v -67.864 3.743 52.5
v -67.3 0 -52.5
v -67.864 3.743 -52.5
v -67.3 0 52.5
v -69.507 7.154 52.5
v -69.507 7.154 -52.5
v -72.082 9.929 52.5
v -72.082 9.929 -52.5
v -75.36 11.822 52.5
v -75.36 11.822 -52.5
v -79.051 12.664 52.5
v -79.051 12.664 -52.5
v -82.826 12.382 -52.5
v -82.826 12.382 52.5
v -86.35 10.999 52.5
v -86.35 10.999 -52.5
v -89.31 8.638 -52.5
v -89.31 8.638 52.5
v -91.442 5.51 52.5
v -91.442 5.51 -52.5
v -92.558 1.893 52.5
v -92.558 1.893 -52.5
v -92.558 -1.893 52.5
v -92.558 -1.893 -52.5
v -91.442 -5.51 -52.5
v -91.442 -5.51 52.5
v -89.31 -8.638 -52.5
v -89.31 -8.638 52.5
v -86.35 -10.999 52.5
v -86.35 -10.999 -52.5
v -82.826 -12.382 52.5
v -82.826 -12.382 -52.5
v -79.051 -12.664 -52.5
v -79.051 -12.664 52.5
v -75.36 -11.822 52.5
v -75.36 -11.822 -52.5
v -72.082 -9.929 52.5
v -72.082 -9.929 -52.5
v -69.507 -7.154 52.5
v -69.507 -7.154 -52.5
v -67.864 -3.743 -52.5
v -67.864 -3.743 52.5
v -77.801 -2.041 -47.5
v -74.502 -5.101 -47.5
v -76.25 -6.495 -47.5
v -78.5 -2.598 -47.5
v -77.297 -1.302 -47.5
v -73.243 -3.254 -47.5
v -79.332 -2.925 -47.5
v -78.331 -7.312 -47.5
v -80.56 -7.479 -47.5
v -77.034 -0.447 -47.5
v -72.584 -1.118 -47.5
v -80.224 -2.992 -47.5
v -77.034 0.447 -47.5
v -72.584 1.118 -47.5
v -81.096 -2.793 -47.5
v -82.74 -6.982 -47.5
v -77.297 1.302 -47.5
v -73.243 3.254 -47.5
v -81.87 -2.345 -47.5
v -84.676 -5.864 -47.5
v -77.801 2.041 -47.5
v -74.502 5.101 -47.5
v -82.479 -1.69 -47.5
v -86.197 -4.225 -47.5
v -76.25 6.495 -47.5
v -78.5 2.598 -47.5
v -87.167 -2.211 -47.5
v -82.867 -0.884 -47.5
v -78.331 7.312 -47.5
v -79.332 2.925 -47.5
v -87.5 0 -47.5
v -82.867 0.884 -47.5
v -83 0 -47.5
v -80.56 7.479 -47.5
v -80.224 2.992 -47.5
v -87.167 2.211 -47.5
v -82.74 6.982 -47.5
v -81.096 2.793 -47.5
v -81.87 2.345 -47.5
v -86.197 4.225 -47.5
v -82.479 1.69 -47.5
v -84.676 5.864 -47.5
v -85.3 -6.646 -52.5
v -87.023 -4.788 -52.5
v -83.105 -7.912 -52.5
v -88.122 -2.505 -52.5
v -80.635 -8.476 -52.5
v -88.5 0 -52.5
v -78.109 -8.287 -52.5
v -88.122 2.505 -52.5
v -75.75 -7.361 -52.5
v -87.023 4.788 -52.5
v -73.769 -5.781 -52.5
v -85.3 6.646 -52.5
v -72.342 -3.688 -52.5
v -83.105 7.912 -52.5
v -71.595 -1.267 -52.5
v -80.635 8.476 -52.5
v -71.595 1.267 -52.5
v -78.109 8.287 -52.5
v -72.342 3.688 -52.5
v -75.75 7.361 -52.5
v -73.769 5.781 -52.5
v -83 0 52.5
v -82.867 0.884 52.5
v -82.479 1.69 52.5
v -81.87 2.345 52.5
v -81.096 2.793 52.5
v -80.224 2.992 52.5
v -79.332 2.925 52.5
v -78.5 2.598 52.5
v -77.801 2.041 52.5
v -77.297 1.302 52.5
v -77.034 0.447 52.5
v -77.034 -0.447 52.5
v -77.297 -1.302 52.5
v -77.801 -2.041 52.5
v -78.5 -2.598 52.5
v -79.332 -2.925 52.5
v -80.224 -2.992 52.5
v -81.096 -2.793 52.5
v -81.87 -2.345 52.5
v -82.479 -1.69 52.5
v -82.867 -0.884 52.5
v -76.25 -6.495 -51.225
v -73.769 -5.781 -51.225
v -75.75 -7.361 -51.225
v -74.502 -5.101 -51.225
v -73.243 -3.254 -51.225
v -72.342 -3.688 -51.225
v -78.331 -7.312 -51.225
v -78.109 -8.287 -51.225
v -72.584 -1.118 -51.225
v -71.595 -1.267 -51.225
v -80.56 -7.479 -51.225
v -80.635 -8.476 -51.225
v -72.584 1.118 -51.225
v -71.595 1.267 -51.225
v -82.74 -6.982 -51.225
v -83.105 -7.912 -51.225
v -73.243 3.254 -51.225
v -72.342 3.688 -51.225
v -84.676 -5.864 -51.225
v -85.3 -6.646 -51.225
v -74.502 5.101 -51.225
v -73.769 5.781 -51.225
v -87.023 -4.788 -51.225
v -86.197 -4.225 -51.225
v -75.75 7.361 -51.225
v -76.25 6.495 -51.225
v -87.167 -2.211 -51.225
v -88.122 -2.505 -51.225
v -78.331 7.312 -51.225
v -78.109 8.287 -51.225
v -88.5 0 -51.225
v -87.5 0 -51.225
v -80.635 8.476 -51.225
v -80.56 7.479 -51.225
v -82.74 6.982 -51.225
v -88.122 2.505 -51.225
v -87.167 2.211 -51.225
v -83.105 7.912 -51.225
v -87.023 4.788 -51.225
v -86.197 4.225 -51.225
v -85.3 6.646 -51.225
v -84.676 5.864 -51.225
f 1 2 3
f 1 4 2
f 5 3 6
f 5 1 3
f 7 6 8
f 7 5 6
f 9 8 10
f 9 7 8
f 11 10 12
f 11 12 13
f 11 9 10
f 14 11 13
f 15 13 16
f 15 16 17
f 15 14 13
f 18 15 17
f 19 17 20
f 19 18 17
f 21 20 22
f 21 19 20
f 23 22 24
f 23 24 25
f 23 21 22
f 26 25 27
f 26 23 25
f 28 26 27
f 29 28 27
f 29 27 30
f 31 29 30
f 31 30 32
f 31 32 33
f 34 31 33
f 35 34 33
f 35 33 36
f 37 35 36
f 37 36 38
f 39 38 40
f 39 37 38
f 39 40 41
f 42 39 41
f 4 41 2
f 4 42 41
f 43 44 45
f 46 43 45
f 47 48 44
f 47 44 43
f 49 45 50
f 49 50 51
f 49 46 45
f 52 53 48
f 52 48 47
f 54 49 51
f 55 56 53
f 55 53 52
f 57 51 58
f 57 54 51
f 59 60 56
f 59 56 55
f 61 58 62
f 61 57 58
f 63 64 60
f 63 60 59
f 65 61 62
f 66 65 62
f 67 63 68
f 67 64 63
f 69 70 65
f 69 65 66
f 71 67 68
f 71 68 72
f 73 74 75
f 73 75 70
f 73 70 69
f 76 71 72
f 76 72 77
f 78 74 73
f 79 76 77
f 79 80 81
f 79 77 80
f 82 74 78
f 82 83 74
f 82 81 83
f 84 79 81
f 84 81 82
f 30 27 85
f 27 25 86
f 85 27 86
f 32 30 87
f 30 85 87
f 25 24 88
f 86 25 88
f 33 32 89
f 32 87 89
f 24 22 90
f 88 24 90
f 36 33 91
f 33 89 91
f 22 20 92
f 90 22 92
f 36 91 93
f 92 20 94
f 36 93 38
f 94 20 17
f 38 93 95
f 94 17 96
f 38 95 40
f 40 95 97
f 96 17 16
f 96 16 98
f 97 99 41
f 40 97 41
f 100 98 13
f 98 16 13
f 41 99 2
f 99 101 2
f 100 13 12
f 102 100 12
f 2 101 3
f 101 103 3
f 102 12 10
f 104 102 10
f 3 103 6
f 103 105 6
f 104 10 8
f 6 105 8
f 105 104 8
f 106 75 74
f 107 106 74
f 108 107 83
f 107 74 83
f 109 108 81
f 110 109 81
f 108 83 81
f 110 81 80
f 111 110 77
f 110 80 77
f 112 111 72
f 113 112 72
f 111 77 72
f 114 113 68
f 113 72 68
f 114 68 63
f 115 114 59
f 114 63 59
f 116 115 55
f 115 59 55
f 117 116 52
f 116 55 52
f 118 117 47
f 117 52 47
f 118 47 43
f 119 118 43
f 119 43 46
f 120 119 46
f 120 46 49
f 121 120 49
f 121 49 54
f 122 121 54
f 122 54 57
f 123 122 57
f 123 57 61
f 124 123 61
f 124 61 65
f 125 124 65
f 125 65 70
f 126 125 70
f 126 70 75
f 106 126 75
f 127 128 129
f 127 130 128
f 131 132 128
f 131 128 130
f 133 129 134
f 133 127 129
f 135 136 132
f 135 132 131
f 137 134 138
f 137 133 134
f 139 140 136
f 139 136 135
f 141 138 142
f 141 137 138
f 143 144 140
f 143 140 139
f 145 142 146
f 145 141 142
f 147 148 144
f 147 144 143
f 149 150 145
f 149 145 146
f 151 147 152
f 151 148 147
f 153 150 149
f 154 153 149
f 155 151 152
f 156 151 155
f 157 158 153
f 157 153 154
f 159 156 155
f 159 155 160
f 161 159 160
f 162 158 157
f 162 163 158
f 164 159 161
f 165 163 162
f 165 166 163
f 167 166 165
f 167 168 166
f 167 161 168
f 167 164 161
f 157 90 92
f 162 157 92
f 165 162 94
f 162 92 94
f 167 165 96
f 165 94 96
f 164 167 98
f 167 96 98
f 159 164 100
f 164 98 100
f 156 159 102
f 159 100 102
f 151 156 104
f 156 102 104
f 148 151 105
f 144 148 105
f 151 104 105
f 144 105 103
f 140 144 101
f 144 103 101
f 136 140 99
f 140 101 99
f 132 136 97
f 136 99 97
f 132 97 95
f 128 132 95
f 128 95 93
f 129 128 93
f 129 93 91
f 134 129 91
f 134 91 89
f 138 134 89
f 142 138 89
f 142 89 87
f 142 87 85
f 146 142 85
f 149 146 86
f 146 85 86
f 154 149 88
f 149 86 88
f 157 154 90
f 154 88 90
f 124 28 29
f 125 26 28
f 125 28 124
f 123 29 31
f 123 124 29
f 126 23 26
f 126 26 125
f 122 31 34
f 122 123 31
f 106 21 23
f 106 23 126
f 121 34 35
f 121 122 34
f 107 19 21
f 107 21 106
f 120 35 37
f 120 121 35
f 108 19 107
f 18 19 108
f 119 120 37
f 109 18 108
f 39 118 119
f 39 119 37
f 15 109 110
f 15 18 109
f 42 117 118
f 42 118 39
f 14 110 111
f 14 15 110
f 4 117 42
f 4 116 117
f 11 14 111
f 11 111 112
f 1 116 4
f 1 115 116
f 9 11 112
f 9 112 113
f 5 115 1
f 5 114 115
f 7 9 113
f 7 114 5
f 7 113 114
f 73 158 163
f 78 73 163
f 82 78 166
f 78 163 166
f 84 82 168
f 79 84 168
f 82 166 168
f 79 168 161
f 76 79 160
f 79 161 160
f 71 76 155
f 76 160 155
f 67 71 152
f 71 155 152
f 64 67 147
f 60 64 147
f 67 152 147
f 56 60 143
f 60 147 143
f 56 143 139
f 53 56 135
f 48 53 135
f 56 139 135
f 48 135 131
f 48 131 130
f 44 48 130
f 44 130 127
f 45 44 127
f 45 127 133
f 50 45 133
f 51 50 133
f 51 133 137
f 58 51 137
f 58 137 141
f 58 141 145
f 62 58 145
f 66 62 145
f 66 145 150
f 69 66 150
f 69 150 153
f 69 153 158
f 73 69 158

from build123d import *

# Parameters (mm, degrees)
SKETCH2_R           = 12.7
BOSS_EXTRUDE1_DEPTH = 52.5
CUT_EXTRUDE1_REACH  = 142.64
SKETCH3_R           = 3
SKETCH4_R           = 8.5
CUT_EXTRUDE2_DEPTH  = 1.275
SKETCH5_R           = 7.5
CUT_EXTRUDE3_DEPTH  = 5


with BuildPart() as part:
    # Sketch2 → Boss-Extrude1 (new, symmetric)
    with BuildSketch(Plane.XY):
        with Locations((-80, 0)):
            Circle(SKETCH2_R)
    extrude(amount=BOSS_EXTRUDE1_DEPTH, both=True)

    # Sketch3 → Cut-Extrude1 (cut, up to next)
    with BuildSketch(Plane(origin=(0, 0, -52.5), x_dir=(-1, 0, 0), z_dir=(0, 0, -1)), mode=Mode.PRIVATE) as cut_extrude1_sk1:
        with Locations((80, 0)):
            Circle(SKETCH3_R)
    cut_extrude1_tool1 = extrude(cut_extrude1_sk1.sketch, amount=-CUT_EXTRUDE1_REACH, mode=Mode.PRIVATE) & part.part
    add(cut_extrude1_tool1.solids().sort_by_distance((-80, 0, -52.5))[0], mode=Mode.SUBTRACT)

    # Sketch4 → Cut-Extrude2 (cut)
    with BuildSketch(Plane(origin=(0, 0, -52.5), x_dir=(-1, 0, 0), z_dir=(0, 0, -1))):
        with Locations((80, 0)):
            Circle(SKETCH4_R)
    extrude(amount=-CUT_EXTRUDE2_DEPTH, mode=Mode.SUBTRACT)

    # Sketch5 → Cut-Extrude3 (cut)
    with BuildSketch(Plane(origin=(0, 0, -52.5), x_dir=(-1, 0, 0), z_dir=(0, 0, -1))):
        with Locations((80, 0)):
            Circle(SKETCH5_R)
    extrude(amount=-CUT_EXTRUDE3_DEPTH, mode=Mode.SUBTRACT)


solid = part.part
